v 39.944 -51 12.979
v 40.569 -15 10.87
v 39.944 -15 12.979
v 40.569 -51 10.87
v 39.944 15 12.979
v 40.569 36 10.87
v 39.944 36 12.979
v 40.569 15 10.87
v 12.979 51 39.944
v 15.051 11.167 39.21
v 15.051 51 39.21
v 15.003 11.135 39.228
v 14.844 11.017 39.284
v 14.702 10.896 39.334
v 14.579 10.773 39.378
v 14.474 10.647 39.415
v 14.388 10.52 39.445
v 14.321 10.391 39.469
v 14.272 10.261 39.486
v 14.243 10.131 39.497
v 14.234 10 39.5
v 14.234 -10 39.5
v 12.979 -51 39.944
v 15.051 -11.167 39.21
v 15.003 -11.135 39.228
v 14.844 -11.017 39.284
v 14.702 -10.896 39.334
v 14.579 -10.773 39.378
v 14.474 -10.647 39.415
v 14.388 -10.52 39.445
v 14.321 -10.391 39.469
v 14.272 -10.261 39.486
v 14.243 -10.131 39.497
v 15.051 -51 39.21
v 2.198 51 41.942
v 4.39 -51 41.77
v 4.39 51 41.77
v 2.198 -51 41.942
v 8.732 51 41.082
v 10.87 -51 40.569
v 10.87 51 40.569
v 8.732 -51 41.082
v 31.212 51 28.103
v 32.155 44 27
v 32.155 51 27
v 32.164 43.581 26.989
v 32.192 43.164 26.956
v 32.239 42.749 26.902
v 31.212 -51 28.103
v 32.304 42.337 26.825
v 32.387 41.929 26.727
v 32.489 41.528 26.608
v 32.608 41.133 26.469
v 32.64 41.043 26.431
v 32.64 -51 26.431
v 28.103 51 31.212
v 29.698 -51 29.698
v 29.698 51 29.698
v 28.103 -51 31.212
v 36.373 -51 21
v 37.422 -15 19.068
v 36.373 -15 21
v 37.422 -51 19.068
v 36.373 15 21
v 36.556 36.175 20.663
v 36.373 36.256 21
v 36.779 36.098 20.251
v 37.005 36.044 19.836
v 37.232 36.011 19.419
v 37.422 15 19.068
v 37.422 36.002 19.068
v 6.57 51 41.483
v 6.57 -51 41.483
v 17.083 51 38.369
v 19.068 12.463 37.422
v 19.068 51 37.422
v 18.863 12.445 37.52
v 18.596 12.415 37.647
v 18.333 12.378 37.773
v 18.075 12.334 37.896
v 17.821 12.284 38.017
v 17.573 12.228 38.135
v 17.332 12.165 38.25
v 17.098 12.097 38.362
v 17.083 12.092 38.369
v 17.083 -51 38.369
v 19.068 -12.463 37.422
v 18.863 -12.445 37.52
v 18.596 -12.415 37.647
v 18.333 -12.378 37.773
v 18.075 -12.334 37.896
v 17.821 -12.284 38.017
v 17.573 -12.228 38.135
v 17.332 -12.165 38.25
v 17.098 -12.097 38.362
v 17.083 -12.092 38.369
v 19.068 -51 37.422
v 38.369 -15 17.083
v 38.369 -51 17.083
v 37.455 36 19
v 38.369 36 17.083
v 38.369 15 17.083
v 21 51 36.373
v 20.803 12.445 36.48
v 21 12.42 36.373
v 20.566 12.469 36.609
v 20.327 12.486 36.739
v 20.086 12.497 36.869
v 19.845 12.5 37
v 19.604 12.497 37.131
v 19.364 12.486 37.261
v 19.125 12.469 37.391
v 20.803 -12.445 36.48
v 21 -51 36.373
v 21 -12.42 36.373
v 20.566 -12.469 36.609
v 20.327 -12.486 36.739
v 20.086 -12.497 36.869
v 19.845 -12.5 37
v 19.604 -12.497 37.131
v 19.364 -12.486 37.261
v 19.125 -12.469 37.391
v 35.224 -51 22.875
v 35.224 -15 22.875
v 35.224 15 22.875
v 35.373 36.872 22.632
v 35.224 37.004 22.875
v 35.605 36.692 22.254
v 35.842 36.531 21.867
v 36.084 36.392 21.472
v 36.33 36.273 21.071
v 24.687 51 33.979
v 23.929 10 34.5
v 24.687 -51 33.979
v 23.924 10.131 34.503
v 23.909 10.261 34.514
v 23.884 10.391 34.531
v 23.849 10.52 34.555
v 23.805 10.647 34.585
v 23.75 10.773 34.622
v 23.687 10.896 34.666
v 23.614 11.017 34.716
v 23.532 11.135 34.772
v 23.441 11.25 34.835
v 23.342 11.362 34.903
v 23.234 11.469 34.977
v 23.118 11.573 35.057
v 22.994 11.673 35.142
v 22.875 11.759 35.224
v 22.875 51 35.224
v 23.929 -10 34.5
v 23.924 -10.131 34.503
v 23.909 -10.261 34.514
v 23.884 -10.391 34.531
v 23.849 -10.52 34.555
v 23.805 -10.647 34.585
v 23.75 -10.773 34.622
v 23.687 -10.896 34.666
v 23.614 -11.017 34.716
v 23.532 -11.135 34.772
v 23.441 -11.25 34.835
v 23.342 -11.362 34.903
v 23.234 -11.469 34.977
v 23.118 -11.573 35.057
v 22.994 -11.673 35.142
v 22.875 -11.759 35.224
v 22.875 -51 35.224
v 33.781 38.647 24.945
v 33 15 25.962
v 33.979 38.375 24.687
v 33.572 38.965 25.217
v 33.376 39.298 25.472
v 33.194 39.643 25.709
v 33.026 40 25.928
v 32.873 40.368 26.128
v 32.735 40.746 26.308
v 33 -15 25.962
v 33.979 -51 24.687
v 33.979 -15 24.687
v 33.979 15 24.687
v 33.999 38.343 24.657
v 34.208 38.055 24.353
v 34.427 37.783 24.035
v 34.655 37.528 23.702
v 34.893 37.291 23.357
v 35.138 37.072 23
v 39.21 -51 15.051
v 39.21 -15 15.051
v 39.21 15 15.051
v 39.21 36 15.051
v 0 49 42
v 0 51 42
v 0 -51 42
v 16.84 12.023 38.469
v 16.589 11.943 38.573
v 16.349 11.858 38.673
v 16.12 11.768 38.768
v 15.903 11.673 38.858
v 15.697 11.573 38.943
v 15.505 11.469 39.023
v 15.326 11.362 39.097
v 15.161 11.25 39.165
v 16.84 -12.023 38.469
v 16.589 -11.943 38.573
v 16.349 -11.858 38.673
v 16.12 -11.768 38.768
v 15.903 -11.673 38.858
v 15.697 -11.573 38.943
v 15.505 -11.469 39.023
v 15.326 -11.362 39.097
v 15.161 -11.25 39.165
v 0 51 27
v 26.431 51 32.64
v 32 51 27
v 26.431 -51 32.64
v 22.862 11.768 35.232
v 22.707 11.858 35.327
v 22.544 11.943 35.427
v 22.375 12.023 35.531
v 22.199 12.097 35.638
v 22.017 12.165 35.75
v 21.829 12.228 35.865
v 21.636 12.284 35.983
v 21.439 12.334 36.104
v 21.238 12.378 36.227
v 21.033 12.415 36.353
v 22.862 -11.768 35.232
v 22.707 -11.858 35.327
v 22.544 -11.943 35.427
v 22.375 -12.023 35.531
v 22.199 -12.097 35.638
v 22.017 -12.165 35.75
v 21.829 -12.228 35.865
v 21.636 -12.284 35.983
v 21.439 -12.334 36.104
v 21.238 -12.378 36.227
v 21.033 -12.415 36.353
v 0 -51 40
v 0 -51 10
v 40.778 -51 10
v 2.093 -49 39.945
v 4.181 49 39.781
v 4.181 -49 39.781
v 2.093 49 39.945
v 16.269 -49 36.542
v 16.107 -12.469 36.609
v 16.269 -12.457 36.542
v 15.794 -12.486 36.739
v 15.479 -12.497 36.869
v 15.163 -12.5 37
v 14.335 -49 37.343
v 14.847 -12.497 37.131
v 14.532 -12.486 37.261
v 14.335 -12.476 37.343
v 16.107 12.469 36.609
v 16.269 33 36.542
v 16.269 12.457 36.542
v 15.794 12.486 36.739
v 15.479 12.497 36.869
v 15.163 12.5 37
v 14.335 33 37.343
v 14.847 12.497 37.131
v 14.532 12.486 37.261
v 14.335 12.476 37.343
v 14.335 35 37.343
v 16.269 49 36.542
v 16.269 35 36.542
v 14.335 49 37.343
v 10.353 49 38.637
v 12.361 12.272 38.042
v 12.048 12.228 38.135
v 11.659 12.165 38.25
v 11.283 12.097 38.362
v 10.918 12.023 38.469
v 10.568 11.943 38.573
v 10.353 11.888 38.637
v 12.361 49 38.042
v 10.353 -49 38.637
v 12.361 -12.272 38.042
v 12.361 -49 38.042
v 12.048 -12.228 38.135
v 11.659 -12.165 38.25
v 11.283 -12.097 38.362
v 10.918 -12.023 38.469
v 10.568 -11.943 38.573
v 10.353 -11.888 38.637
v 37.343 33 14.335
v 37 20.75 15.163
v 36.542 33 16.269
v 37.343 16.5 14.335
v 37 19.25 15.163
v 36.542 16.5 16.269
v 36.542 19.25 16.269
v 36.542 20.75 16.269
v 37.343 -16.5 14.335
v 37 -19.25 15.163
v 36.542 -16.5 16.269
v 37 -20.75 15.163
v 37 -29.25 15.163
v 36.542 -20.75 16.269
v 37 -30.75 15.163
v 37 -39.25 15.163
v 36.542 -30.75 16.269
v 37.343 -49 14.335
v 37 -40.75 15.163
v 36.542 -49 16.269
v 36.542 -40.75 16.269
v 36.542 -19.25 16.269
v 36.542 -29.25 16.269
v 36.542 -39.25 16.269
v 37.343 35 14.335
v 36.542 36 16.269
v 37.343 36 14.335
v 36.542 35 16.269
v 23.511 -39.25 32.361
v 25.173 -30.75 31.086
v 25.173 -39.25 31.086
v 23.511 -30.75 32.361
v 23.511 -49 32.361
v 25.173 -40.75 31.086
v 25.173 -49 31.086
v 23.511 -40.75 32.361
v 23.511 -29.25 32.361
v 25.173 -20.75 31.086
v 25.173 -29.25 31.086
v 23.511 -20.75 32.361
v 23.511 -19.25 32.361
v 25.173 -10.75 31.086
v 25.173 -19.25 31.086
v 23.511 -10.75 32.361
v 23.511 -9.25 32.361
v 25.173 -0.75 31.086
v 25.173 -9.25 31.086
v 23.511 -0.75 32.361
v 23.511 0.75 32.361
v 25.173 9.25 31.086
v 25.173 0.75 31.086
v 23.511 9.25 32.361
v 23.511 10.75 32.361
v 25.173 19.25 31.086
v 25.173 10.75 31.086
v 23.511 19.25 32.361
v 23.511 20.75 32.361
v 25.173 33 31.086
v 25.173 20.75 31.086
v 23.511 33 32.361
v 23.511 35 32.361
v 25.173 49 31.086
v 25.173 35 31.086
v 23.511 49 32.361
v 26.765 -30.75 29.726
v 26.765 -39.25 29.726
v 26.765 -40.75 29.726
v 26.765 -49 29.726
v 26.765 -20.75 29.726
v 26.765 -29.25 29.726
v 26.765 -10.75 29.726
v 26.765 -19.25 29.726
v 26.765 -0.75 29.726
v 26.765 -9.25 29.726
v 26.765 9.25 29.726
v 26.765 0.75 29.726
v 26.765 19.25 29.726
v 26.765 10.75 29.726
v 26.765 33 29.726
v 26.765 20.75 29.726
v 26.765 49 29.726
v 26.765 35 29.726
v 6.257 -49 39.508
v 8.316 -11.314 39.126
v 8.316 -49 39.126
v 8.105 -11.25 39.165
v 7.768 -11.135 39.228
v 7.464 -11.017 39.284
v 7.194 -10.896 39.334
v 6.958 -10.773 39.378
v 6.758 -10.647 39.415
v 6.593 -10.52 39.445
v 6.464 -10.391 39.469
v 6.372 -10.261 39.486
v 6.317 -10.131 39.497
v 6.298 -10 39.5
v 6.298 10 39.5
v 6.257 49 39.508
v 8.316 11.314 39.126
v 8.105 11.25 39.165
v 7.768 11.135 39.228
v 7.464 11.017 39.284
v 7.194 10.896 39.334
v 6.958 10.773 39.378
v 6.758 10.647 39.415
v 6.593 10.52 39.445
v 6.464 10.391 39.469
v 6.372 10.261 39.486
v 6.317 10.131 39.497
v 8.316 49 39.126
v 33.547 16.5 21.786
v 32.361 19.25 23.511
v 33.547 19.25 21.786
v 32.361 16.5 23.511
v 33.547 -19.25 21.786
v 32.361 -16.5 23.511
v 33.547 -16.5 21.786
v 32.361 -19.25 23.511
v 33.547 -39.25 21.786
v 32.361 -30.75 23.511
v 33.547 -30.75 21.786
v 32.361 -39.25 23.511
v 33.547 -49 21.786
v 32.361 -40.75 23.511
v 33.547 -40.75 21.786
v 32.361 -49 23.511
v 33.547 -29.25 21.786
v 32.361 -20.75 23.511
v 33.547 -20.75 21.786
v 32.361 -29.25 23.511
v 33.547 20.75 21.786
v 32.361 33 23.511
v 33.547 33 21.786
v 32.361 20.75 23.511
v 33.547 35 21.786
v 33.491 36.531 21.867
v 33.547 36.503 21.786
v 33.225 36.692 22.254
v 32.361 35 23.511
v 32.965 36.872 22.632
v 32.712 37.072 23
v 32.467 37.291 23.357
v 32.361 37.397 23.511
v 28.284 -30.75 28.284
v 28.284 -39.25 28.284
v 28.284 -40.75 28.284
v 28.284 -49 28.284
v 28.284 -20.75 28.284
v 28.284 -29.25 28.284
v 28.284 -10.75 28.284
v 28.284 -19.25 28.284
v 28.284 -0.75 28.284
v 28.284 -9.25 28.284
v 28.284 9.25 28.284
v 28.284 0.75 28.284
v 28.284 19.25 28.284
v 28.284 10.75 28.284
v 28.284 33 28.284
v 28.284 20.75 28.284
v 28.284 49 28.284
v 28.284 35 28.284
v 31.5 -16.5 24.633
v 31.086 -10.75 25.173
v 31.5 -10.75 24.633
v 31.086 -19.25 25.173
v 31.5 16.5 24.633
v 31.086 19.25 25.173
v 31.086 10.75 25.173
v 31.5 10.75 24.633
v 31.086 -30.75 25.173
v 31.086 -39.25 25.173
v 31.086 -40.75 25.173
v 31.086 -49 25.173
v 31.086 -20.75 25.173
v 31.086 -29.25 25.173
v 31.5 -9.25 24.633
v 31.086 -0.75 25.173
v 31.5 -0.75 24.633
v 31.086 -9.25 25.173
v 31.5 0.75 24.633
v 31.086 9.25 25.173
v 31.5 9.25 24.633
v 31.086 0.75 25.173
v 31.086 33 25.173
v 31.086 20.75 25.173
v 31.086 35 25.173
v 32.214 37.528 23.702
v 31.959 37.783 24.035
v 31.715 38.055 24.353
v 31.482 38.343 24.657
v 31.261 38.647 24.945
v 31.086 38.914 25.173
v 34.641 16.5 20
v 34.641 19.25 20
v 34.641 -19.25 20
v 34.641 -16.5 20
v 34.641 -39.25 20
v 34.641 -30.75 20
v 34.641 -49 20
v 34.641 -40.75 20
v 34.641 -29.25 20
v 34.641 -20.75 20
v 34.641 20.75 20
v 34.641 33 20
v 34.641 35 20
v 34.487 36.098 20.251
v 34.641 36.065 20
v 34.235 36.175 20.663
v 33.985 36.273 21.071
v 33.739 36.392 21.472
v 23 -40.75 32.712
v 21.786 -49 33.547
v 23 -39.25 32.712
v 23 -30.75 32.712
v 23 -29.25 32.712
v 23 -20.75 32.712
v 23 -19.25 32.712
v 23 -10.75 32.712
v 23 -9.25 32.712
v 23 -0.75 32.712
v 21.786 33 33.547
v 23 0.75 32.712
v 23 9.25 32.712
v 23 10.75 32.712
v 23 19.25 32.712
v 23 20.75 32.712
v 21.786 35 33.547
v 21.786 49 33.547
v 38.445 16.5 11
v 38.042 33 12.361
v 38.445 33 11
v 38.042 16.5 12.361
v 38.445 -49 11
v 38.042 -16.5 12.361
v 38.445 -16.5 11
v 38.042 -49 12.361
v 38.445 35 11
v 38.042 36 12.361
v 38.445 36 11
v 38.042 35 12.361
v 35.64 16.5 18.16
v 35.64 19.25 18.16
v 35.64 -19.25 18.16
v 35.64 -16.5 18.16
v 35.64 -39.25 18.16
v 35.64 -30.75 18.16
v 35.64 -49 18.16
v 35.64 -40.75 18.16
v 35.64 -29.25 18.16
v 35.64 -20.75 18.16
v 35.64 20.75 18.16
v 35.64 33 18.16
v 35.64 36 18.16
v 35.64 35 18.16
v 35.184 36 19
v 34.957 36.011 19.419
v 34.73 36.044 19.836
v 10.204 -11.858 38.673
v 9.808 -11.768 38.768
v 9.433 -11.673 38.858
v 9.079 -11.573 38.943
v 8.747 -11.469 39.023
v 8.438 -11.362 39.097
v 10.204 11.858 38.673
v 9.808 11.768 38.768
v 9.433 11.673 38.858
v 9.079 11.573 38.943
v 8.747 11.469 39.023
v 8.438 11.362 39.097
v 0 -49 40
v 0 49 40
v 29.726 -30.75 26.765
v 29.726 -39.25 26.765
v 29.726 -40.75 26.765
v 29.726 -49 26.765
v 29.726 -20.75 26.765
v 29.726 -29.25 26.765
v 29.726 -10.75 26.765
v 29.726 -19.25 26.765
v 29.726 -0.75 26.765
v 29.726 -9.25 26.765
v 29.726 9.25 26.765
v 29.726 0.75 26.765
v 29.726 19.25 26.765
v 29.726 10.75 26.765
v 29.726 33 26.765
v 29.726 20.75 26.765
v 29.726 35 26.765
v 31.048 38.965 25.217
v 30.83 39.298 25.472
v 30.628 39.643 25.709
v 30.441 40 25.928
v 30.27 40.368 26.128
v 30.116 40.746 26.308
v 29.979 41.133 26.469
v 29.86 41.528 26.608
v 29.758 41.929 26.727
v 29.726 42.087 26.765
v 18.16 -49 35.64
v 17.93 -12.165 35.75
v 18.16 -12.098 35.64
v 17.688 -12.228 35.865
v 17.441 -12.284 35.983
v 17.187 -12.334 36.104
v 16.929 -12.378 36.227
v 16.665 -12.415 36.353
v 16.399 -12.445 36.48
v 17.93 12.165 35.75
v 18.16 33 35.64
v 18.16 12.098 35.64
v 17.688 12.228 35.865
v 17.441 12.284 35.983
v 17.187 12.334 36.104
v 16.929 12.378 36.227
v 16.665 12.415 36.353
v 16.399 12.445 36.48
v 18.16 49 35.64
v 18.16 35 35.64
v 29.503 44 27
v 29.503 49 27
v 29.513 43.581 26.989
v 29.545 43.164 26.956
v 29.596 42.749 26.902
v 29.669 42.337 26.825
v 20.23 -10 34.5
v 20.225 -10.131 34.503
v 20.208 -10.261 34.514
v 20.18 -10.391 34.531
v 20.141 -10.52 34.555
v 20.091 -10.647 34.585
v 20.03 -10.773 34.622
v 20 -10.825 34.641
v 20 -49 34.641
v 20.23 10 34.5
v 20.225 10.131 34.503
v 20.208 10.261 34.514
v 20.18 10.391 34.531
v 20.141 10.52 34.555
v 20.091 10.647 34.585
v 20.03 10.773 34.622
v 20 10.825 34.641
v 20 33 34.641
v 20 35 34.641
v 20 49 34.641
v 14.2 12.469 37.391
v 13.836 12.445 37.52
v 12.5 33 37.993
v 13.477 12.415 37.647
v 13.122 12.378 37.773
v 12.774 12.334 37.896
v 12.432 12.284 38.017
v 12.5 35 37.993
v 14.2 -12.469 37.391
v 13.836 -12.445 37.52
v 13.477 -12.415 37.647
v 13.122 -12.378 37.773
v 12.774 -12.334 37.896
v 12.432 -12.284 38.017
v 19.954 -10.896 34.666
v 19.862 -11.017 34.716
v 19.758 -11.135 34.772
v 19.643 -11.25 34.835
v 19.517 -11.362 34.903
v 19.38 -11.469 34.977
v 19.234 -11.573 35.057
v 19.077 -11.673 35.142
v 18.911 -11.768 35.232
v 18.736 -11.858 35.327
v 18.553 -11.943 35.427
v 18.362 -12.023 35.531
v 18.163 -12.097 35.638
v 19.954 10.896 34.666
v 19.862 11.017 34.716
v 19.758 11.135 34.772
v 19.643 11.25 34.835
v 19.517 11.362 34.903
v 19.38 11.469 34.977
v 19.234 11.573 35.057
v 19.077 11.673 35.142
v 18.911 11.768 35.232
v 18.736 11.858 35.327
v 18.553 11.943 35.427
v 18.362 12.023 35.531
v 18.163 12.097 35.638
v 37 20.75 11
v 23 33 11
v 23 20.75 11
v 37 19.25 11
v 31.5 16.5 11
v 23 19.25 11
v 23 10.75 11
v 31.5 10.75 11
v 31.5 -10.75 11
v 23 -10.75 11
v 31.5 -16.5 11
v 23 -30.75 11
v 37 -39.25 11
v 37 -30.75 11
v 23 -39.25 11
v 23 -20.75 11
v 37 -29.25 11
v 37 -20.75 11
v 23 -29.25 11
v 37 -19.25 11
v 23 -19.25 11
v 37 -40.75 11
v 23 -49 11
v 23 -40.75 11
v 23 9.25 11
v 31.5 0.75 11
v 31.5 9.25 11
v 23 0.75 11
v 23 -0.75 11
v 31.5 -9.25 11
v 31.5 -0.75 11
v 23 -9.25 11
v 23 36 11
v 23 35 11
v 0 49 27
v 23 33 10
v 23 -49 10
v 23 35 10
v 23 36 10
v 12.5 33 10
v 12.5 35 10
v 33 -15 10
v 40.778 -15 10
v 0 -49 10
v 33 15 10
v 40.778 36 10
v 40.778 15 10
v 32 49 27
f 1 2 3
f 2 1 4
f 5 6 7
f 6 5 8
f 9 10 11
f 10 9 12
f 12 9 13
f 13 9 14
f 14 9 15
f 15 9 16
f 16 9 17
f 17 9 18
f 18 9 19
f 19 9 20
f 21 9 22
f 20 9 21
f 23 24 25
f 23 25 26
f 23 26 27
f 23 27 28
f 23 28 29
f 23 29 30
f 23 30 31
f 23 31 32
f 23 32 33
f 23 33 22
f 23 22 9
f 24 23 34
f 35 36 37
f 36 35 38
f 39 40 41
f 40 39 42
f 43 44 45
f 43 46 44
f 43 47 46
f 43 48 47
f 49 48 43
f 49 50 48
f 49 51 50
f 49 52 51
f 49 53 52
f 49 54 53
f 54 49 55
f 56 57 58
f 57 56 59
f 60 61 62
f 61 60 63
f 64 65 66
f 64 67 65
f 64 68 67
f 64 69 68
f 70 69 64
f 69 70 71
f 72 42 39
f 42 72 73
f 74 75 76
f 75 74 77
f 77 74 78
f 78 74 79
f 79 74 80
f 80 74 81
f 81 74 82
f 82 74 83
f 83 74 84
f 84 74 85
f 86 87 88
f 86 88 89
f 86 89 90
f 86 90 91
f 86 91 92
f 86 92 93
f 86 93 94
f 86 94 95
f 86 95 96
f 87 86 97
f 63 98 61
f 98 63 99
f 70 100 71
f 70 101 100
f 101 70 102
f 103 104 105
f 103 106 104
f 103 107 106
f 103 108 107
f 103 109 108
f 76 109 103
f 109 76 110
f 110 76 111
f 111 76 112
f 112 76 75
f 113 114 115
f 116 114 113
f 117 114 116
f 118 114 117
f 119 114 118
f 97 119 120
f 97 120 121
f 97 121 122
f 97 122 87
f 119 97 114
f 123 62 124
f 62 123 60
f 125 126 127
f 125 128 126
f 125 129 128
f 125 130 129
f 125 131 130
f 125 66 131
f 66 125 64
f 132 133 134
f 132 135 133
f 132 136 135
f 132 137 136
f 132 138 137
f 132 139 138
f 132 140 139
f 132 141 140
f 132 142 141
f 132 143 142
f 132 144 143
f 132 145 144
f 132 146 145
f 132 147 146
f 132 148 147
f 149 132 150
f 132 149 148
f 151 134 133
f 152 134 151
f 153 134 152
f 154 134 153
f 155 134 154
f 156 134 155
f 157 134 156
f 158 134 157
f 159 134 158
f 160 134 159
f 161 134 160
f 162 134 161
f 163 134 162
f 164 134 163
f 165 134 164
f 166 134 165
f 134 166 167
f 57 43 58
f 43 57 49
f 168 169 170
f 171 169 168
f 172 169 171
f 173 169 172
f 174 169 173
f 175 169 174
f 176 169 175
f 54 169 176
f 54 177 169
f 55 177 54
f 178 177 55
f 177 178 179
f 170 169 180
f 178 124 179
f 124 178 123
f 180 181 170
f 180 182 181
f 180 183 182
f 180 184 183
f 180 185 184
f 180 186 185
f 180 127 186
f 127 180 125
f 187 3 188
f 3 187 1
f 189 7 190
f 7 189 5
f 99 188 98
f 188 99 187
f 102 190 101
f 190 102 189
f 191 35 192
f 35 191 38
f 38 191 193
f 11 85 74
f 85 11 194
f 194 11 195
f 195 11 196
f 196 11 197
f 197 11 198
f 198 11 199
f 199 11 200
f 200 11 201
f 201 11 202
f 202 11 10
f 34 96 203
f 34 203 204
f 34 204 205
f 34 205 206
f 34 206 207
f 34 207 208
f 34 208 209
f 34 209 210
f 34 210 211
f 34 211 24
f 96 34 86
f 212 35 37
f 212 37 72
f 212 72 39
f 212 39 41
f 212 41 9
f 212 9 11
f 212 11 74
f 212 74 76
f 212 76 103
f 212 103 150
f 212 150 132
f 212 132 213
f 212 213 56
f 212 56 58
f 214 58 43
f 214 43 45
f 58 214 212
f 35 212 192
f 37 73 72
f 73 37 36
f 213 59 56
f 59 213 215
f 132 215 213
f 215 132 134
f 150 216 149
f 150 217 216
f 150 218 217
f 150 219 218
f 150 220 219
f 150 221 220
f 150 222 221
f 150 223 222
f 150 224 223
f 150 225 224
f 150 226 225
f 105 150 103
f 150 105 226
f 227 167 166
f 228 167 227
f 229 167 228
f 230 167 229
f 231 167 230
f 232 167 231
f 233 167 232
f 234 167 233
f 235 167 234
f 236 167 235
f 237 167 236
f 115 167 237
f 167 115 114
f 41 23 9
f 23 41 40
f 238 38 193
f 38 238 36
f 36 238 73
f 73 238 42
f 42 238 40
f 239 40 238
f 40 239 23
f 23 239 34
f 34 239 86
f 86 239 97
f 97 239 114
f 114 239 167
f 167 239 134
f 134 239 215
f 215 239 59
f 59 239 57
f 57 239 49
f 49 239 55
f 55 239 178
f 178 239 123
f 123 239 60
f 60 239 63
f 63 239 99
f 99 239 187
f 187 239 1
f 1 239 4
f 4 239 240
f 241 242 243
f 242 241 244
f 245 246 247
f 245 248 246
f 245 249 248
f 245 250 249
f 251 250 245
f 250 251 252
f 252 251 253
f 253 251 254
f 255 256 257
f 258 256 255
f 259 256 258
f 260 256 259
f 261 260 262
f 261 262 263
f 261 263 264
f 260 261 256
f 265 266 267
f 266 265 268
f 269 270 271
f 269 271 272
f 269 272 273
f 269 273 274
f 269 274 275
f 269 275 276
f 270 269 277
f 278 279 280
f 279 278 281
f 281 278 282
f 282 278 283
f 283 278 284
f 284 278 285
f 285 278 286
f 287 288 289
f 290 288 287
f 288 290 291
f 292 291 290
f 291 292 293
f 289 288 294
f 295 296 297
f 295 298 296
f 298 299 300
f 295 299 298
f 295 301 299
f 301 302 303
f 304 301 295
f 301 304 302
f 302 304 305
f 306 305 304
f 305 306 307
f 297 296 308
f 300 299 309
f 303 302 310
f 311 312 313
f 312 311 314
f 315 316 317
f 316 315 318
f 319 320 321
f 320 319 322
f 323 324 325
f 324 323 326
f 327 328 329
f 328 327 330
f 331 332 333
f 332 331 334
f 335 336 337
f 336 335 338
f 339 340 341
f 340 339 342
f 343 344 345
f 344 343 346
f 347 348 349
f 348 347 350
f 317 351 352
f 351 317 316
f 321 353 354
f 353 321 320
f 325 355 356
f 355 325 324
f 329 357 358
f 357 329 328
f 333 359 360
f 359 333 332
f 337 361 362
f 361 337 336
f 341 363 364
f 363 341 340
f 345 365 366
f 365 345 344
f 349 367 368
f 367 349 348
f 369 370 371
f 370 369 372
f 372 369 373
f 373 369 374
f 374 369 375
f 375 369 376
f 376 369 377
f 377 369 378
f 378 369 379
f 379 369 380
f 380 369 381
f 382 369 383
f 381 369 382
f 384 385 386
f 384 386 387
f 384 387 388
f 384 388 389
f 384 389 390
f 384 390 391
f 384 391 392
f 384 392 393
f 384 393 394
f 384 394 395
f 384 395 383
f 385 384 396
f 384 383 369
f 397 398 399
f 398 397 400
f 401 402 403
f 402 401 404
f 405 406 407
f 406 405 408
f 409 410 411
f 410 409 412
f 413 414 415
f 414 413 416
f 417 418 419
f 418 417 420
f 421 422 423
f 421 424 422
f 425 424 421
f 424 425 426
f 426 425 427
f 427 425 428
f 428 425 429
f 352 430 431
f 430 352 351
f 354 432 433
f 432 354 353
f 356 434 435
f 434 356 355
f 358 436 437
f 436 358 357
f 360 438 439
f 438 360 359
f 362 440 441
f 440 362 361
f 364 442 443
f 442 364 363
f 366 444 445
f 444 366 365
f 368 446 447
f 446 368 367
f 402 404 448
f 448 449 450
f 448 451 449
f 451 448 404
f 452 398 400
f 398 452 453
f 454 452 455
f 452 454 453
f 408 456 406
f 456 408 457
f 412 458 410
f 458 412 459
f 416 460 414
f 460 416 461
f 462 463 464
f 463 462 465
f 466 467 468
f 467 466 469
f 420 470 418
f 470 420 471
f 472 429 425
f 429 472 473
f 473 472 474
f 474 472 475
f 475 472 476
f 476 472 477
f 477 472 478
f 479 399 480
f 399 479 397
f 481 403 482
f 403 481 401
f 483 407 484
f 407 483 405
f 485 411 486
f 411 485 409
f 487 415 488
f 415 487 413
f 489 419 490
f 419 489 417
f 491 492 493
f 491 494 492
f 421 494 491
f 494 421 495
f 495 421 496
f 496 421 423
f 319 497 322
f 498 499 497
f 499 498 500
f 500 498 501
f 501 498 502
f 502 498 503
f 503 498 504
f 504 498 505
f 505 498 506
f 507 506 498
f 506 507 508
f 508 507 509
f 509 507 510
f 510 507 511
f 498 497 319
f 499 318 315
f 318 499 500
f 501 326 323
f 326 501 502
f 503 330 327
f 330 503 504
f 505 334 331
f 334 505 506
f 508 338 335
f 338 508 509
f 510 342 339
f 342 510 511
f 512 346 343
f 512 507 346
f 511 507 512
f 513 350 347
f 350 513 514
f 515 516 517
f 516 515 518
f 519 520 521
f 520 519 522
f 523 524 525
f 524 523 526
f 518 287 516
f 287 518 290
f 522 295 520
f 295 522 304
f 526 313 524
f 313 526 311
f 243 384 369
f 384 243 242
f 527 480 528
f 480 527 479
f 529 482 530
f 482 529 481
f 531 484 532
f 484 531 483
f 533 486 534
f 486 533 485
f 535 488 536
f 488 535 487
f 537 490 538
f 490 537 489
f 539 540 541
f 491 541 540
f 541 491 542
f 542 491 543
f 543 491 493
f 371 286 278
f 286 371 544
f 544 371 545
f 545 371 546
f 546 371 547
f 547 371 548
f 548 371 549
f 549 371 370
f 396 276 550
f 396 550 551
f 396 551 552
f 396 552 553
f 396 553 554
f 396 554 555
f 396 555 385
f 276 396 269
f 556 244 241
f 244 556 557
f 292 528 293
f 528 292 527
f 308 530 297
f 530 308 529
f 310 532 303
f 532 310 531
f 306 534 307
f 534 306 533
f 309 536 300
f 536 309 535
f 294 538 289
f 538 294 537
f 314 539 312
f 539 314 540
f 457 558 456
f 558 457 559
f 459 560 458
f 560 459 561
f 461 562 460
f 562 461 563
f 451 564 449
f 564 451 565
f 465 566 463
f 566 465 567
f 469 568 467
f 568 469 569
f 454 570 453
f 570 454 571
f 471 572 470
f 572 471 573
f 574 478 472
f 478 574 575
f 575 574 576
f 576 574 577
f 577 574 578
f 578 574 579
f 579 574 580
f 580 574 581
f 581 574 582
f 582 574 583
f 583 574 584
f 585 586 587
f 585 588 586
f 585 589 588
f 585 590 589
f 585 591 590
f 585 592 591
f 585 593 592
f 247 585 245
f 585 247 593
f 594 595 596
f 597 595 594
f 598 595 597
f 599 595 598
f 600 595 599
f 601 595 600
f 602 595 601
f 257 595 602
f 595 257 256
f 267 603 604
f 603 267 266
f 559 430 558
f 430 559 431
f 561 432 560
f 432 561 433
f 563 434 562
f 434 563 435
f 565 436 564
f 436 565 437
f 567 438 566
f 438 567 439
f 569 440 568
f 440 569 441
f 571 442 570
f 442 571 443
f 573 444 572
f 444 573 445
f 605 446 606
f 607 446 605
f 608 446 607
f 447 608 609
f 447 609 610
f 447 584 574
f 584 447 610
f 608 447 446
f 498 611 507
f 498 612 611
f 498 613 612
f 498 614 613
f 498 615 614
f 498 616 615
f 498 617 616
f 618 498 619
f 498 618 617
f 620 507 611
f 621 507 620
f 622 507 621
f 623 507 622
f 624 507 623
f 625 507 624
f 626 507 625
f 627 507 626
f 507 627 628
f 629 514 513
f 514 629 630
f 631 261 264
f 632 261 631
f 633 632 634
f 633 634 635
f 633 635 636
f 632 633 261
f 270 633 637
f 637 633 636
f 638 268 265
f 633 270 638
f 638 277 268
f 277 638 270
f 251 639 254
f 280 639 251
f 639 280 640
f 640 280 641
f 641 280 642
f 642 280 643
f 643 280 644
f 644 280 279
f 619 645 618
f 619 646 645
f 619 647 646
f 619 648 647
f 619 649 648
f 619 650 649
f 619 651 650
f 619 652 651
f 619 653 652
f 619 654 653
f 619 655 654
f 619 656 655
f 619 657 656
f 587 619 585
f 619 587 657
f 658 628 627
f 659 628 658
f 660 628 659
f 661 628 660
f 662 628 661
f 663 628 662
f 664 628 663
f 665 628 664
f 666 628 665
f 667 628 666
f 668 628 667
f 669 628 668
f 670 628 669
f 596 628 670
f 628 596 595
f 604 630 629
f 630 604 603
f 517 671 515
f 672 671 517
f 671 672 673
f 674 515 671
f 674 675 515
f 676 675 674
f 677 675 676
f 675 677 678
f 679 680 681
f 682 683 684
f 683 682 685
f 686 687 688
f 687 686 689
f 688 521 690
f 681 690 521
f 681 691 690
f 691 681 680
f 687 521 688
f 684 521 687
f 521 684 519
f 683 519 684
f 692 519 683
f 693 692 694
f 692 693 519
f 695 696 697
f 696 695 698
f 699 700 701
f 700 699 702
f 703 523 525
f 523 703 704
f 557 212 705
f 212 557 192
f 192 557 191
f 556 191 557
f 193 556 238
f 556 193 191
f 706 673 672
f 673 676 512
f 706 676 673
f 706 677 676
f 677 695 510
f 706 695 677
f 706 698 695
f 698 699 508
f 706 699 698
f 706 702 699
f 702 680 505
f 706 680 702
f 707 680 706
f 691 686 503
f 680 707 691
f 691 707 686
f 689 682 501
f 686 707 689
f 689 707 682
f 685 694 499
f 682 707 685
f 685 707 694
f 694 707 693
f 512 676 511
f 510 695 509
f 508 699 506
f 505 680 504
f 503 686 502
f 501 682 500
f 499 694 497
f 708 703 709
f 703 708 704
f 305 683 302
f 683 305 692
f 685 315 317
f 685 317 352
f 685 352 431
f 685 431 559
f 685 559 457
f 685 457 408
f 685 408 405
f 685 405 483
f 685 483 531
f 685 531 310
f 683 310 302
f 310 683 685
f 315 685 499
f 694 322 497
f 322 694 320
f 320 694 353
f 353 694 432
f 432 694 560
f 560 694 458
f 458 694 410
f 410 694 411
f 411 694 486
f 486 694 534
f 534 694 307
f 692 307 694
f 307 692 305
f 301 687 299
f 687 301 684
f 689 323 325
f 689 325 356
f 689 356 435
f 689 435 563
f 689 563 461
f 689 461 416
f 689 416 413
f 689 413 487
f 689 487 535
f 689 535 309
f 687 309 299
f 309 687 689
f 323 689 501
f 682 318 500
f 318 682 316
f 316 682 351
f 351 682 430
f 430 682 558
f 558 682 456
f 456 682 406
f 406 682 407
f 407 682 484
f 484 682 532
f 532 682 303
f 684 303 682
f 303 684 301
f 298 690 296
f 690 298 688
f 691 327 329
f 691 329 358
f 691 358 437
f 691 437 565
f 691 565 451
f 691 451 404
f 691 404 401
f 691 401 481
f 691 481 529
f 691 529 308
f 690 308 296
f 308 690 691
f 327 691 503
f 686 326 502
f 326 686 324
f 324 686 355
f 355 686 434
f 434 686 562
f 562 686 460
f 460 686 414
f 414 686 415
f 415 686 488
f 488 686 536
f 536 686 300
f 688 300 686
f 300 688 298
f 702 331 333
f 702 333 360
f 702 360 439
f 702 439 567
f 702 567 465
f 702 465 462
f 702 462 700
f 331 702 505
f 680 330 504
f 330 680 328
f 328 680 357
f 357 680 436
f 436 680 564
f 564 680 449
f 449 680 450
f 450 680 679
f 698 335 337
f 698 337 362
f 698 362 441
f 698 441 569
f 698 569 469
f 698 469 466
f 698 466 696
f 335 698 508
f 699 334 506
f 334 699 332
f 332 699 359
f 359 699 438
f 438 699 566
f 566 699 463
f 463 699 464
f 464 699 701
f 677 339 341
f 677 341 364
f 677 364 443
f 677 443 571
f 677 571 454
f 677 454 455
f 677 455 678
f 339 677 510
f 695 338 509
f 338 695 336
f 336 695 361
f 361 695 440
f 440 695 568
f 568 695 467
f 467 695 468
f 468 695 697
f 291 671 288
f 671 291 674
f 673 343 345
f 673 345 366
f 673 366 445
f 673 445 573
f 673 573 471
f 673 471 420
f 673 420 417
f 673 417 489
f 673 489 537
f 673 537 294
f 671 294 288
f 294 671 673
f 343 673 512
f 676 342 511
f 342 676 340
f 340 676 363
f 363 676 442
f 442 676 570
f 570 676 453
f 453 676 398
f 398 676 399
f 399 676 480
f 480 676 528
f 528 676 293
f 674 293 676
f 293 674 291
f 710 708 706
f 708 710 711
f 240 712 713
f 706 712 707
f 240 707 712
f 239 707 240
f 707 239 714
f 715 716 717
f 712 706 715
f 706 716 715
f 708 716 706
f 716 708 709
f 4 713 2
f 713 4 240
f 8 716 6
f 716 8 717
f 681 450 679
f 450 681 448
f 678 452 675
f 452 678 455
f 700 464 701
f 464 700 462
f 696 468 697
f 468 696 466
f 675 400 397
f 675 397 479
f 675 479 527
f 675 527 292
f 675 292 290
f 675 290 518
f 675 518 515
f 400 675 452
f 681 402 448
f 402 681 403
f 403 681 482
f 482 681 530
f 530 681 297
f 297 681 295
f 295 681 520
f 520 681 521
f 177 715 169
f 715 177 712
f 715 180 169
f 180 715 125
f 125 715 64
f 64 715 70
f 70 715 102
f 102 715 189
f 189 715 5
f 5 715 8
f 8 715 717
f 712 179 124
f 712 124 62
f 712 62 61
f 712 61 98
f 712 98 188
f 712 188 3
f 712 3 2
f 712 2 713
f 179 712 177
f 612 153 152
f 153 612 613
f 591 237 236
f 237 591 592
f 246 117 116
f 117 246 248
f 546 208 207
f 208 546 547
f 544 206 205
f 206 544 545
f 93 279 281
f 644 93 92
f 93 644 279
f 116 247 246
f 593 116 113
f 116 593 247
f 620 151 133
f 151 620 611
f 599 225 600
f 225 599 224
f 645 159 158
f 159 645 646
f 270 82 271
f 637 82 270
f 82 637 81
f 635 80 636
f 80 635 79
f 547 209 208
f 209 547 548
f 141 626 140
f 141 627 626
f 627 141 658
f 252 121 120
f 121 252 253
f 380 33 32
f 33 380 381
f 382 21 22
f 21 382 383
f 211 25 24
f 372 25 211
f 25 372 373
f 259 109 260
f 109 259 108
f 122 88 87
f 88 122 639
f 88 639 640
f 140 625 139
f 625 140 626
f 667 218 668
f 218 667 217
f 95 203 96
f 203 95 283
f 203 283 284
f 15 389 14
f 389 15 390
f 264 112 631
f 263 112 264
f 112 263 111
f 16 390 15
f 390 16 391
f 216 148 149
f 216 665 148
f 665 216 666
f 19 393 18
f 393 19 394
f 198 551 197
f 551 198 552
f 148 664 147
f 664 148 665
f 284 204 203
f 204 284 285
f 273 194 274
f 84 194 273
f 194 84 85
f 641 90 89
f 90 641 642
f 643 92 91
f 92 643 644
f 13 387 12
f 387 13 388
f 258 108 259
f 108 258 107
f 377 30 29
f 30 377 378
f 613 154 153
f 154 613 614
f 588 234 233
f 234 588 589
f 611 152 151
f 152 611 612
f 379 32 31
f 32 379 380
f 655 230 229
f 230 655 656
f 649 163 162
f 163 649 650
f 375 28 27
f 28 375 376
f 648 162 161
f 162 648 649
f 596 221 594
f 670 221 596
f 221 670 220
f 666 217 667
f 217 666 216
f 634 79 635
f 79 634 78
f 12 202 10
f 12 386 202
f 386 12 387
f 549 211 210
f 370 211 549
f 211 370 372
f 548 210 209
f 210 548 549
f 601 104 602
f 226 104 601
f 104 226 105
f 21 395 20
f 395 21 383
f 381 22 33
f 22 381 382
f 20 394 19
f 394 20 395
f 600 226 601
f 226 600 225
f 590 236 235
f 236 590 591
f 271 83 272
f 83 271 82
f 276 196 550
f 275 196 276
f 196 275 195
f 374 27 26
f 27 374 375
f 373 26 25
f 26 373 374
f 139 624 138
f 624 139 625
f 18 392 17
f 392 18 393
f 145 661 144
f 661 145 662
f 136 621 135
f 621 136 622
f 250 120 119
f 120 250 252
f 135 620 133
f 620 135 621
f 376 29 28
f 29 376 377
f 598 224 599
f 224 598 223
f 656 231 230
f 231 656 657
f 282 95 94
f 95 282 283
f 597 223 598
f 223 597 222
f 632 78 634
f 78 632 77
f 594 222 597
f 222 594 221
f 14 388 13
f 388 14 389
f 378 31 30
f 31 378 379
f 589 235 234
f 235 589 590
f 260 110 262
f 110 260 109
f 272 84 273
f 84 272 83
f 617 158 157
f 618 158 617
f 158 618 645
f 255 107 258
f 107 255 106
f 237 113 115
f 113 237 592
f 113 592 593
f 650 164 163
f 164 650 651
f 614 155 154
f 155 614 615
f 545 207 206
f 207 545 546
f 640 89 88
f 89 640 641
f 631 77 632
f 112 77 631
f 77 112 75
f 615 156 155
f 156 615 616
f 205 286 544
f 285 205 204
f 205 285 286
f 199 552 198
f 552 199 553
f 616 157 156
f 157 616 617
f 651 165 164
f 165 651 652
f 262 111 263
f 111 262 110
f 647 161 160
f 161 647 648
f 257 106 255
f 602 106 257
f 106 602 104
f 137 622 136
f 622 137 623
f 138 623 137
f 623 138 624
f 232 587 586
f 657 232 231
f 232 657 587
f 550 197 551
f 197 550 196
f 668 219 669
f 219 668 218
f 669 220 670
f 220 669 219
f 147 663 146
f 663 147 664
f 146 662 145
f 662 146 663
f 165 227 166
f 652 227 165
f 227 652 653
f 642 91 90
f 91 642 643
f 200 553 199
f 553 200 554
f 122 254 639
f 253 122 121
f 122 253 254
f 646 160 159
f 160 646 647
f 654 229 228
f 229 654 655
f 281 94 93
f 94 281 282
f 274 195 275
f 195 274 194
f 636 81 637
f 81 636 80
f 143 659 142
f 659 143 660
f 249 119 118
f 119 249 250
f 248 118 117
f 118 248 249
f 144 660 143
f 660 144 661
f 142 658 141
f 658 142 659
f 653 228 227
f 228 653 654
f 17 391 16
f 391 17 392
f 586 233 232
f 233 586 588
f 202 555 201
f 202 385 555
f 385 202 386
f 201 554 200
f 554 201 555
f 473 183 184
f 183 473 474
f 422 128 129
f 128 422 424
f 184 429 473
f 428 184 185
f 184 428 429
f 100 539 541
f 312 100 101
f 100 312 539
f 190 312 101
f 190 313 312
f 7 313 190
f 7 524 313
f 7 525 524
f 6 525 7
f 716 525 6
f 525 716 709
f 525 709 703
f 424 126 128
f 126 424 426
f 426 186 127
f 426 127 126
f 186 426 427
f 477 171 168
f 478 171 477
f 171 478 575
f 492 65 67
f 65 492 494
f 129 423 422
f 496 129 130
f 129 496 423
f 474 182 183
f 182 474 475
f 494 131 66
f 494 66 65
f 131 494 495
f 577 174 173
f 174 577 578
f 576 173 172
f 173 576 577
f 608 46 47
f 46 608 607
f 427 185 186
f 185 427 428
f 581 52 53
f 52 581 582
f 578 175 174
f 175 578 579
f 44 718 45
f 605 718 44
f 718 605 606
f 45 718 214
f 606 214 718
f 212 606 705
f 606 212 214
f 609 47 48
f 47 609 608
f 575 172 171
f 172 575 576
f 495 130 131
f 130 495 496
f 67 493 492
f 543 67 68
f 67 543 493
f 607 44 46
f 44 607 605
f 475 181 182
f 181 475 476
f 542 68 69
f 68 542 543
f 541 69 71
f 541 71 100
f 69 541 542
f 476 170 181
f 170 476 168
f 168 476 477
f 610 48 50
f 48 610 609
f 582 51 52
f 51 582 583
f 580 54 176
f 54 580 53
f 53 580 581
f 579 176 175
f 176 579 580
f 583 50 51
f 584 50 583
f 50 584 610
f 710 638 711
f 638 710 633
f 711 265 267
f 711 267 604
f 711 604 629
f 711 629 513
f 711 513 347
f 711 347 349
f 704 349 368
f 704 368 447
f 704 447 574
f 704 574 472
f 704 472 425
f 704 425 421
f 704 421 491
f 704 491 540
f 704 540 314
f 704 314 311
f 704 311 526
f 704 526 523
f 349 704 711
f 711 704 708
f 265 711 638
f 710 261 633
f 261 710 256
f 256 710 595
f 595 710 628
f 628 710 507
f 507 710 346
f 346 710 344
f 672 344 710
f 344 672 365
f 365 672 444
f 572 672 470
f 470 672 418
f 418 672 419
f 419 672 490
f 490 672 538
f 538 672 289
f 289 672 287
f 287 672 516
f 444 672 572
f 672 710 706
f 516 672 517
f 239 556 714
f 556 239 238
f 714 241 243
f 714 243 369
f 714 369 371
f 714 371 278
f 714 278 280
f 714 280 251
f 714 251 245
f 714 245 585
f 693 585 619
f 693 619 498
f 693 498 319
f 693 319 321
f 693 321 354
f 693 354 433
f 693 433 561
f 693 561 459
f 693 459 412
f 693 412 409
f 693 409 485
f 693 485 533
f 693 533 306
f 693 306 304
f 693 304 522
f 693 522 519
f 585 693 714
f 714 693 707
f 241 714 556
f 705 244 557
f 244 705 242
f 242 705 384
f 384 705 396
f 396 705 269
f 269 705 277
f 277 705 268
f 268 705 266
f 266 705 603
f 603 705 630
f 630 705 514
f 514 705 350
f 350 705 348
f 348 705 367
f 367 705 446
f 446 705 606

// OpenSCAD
$fn=120;

module battery() {
    color("blue") {
        translate([-9,0,9]) rotate([90,0,0]) cylinder(r=18/2, h=65, center=true);
        translate([-9,0,-9]) rotate([90,0,0]) cylinder(r=18/2, h=65, center=true);
        translate([9,0,-9]) rotate([90,0,0]) cylinder(r=18/2, h=65, center=true);
        translate([9,0,9]) rotate([90,0,0]) cylinder(r=18/2, h=65, center=true);
    }
}

module hole() {
    hull() {
        translate([0, -10, 0]) cylinder(r=2.5, h=50, center=true);
        translate([0, 10, 0]) cylinder(r=2.5, h=50, center=true);
    }
}


difference() {
    union() {
        difference() {
            rotate([90,0,0]) {
                difference() {
                    cylinder(r=42, h=102, center=true);
                    cylinder(r=42-2, h=103, center=true);
                }
            }

            translate([0,0,-50+11]) cube([100,250,100], center=true);
            translate([-50,0,50]) cube([100,250,100], center=true);
        }

        intersection() { 
            union() {
                translate([32,0,10.5]) cube([18,102,1], center=true);
                for (a=[-50 : 10 : 20]) {
                    color("red") translate([30,a,23]) cube([14,1.5,25], center=true);
                }
            }
            rotate([90,0,0]) cylinder(r=42, h=102, center=true);
        }
        
        intersection() { 
            color("grey") translate([40,0,30]) cube([17,33,40], center=true);
            rotate([90,0,0]) cylinder(r=42, h=102, center=true);
        }

    }


    translate([37,0,0]) cube([8, 30, 100], center=true);
    
    hull() {
        translate([9,0,9 + 18]) rotate([90,0,0]) cylinder(r=22/2, h=67, center=true);
        translate([9-20,0,9 + 18]) rotate([90,0,0]) cylinder(r=22/2, h=67, center=true);
    }
    
    translate([10,0,37]) rotate([0,90,0]) hole();
    
    hull() {
        translate([30,44,19]) rotate([0,90,0]) cylinder(r=8, h=50, center=true);
        translate([30,44,0]) rotate([0,90,0]) cylinder(r=8, h=50, center=true);
        translate([30,55,19]) rotate([0,90,0]) cylinder(r=8, h=50, center=true);
    }
    
}

intersection() { 
    color("green") translate([30,52-18,25]) cube([35,2,30], center=true);
    rotate([90,0,0]) cylinder(r=42, h=102, center=true);
}

intersection() { 
    color("blue") translate([20,-50,25]) cube([40,2,30], center=true);
    rotate([90,0,0]) cylinder(r=42, h=102, center=true);
}

intersection() {
    translate([0,50,0]) {
        rotate([90,0,0]) {
            cylinder(r=42, h=2, center=true);
        }
    }
    translate([0,49,27]) cube([32,10,30]);
}


//translate([0,0,18]) battery();
